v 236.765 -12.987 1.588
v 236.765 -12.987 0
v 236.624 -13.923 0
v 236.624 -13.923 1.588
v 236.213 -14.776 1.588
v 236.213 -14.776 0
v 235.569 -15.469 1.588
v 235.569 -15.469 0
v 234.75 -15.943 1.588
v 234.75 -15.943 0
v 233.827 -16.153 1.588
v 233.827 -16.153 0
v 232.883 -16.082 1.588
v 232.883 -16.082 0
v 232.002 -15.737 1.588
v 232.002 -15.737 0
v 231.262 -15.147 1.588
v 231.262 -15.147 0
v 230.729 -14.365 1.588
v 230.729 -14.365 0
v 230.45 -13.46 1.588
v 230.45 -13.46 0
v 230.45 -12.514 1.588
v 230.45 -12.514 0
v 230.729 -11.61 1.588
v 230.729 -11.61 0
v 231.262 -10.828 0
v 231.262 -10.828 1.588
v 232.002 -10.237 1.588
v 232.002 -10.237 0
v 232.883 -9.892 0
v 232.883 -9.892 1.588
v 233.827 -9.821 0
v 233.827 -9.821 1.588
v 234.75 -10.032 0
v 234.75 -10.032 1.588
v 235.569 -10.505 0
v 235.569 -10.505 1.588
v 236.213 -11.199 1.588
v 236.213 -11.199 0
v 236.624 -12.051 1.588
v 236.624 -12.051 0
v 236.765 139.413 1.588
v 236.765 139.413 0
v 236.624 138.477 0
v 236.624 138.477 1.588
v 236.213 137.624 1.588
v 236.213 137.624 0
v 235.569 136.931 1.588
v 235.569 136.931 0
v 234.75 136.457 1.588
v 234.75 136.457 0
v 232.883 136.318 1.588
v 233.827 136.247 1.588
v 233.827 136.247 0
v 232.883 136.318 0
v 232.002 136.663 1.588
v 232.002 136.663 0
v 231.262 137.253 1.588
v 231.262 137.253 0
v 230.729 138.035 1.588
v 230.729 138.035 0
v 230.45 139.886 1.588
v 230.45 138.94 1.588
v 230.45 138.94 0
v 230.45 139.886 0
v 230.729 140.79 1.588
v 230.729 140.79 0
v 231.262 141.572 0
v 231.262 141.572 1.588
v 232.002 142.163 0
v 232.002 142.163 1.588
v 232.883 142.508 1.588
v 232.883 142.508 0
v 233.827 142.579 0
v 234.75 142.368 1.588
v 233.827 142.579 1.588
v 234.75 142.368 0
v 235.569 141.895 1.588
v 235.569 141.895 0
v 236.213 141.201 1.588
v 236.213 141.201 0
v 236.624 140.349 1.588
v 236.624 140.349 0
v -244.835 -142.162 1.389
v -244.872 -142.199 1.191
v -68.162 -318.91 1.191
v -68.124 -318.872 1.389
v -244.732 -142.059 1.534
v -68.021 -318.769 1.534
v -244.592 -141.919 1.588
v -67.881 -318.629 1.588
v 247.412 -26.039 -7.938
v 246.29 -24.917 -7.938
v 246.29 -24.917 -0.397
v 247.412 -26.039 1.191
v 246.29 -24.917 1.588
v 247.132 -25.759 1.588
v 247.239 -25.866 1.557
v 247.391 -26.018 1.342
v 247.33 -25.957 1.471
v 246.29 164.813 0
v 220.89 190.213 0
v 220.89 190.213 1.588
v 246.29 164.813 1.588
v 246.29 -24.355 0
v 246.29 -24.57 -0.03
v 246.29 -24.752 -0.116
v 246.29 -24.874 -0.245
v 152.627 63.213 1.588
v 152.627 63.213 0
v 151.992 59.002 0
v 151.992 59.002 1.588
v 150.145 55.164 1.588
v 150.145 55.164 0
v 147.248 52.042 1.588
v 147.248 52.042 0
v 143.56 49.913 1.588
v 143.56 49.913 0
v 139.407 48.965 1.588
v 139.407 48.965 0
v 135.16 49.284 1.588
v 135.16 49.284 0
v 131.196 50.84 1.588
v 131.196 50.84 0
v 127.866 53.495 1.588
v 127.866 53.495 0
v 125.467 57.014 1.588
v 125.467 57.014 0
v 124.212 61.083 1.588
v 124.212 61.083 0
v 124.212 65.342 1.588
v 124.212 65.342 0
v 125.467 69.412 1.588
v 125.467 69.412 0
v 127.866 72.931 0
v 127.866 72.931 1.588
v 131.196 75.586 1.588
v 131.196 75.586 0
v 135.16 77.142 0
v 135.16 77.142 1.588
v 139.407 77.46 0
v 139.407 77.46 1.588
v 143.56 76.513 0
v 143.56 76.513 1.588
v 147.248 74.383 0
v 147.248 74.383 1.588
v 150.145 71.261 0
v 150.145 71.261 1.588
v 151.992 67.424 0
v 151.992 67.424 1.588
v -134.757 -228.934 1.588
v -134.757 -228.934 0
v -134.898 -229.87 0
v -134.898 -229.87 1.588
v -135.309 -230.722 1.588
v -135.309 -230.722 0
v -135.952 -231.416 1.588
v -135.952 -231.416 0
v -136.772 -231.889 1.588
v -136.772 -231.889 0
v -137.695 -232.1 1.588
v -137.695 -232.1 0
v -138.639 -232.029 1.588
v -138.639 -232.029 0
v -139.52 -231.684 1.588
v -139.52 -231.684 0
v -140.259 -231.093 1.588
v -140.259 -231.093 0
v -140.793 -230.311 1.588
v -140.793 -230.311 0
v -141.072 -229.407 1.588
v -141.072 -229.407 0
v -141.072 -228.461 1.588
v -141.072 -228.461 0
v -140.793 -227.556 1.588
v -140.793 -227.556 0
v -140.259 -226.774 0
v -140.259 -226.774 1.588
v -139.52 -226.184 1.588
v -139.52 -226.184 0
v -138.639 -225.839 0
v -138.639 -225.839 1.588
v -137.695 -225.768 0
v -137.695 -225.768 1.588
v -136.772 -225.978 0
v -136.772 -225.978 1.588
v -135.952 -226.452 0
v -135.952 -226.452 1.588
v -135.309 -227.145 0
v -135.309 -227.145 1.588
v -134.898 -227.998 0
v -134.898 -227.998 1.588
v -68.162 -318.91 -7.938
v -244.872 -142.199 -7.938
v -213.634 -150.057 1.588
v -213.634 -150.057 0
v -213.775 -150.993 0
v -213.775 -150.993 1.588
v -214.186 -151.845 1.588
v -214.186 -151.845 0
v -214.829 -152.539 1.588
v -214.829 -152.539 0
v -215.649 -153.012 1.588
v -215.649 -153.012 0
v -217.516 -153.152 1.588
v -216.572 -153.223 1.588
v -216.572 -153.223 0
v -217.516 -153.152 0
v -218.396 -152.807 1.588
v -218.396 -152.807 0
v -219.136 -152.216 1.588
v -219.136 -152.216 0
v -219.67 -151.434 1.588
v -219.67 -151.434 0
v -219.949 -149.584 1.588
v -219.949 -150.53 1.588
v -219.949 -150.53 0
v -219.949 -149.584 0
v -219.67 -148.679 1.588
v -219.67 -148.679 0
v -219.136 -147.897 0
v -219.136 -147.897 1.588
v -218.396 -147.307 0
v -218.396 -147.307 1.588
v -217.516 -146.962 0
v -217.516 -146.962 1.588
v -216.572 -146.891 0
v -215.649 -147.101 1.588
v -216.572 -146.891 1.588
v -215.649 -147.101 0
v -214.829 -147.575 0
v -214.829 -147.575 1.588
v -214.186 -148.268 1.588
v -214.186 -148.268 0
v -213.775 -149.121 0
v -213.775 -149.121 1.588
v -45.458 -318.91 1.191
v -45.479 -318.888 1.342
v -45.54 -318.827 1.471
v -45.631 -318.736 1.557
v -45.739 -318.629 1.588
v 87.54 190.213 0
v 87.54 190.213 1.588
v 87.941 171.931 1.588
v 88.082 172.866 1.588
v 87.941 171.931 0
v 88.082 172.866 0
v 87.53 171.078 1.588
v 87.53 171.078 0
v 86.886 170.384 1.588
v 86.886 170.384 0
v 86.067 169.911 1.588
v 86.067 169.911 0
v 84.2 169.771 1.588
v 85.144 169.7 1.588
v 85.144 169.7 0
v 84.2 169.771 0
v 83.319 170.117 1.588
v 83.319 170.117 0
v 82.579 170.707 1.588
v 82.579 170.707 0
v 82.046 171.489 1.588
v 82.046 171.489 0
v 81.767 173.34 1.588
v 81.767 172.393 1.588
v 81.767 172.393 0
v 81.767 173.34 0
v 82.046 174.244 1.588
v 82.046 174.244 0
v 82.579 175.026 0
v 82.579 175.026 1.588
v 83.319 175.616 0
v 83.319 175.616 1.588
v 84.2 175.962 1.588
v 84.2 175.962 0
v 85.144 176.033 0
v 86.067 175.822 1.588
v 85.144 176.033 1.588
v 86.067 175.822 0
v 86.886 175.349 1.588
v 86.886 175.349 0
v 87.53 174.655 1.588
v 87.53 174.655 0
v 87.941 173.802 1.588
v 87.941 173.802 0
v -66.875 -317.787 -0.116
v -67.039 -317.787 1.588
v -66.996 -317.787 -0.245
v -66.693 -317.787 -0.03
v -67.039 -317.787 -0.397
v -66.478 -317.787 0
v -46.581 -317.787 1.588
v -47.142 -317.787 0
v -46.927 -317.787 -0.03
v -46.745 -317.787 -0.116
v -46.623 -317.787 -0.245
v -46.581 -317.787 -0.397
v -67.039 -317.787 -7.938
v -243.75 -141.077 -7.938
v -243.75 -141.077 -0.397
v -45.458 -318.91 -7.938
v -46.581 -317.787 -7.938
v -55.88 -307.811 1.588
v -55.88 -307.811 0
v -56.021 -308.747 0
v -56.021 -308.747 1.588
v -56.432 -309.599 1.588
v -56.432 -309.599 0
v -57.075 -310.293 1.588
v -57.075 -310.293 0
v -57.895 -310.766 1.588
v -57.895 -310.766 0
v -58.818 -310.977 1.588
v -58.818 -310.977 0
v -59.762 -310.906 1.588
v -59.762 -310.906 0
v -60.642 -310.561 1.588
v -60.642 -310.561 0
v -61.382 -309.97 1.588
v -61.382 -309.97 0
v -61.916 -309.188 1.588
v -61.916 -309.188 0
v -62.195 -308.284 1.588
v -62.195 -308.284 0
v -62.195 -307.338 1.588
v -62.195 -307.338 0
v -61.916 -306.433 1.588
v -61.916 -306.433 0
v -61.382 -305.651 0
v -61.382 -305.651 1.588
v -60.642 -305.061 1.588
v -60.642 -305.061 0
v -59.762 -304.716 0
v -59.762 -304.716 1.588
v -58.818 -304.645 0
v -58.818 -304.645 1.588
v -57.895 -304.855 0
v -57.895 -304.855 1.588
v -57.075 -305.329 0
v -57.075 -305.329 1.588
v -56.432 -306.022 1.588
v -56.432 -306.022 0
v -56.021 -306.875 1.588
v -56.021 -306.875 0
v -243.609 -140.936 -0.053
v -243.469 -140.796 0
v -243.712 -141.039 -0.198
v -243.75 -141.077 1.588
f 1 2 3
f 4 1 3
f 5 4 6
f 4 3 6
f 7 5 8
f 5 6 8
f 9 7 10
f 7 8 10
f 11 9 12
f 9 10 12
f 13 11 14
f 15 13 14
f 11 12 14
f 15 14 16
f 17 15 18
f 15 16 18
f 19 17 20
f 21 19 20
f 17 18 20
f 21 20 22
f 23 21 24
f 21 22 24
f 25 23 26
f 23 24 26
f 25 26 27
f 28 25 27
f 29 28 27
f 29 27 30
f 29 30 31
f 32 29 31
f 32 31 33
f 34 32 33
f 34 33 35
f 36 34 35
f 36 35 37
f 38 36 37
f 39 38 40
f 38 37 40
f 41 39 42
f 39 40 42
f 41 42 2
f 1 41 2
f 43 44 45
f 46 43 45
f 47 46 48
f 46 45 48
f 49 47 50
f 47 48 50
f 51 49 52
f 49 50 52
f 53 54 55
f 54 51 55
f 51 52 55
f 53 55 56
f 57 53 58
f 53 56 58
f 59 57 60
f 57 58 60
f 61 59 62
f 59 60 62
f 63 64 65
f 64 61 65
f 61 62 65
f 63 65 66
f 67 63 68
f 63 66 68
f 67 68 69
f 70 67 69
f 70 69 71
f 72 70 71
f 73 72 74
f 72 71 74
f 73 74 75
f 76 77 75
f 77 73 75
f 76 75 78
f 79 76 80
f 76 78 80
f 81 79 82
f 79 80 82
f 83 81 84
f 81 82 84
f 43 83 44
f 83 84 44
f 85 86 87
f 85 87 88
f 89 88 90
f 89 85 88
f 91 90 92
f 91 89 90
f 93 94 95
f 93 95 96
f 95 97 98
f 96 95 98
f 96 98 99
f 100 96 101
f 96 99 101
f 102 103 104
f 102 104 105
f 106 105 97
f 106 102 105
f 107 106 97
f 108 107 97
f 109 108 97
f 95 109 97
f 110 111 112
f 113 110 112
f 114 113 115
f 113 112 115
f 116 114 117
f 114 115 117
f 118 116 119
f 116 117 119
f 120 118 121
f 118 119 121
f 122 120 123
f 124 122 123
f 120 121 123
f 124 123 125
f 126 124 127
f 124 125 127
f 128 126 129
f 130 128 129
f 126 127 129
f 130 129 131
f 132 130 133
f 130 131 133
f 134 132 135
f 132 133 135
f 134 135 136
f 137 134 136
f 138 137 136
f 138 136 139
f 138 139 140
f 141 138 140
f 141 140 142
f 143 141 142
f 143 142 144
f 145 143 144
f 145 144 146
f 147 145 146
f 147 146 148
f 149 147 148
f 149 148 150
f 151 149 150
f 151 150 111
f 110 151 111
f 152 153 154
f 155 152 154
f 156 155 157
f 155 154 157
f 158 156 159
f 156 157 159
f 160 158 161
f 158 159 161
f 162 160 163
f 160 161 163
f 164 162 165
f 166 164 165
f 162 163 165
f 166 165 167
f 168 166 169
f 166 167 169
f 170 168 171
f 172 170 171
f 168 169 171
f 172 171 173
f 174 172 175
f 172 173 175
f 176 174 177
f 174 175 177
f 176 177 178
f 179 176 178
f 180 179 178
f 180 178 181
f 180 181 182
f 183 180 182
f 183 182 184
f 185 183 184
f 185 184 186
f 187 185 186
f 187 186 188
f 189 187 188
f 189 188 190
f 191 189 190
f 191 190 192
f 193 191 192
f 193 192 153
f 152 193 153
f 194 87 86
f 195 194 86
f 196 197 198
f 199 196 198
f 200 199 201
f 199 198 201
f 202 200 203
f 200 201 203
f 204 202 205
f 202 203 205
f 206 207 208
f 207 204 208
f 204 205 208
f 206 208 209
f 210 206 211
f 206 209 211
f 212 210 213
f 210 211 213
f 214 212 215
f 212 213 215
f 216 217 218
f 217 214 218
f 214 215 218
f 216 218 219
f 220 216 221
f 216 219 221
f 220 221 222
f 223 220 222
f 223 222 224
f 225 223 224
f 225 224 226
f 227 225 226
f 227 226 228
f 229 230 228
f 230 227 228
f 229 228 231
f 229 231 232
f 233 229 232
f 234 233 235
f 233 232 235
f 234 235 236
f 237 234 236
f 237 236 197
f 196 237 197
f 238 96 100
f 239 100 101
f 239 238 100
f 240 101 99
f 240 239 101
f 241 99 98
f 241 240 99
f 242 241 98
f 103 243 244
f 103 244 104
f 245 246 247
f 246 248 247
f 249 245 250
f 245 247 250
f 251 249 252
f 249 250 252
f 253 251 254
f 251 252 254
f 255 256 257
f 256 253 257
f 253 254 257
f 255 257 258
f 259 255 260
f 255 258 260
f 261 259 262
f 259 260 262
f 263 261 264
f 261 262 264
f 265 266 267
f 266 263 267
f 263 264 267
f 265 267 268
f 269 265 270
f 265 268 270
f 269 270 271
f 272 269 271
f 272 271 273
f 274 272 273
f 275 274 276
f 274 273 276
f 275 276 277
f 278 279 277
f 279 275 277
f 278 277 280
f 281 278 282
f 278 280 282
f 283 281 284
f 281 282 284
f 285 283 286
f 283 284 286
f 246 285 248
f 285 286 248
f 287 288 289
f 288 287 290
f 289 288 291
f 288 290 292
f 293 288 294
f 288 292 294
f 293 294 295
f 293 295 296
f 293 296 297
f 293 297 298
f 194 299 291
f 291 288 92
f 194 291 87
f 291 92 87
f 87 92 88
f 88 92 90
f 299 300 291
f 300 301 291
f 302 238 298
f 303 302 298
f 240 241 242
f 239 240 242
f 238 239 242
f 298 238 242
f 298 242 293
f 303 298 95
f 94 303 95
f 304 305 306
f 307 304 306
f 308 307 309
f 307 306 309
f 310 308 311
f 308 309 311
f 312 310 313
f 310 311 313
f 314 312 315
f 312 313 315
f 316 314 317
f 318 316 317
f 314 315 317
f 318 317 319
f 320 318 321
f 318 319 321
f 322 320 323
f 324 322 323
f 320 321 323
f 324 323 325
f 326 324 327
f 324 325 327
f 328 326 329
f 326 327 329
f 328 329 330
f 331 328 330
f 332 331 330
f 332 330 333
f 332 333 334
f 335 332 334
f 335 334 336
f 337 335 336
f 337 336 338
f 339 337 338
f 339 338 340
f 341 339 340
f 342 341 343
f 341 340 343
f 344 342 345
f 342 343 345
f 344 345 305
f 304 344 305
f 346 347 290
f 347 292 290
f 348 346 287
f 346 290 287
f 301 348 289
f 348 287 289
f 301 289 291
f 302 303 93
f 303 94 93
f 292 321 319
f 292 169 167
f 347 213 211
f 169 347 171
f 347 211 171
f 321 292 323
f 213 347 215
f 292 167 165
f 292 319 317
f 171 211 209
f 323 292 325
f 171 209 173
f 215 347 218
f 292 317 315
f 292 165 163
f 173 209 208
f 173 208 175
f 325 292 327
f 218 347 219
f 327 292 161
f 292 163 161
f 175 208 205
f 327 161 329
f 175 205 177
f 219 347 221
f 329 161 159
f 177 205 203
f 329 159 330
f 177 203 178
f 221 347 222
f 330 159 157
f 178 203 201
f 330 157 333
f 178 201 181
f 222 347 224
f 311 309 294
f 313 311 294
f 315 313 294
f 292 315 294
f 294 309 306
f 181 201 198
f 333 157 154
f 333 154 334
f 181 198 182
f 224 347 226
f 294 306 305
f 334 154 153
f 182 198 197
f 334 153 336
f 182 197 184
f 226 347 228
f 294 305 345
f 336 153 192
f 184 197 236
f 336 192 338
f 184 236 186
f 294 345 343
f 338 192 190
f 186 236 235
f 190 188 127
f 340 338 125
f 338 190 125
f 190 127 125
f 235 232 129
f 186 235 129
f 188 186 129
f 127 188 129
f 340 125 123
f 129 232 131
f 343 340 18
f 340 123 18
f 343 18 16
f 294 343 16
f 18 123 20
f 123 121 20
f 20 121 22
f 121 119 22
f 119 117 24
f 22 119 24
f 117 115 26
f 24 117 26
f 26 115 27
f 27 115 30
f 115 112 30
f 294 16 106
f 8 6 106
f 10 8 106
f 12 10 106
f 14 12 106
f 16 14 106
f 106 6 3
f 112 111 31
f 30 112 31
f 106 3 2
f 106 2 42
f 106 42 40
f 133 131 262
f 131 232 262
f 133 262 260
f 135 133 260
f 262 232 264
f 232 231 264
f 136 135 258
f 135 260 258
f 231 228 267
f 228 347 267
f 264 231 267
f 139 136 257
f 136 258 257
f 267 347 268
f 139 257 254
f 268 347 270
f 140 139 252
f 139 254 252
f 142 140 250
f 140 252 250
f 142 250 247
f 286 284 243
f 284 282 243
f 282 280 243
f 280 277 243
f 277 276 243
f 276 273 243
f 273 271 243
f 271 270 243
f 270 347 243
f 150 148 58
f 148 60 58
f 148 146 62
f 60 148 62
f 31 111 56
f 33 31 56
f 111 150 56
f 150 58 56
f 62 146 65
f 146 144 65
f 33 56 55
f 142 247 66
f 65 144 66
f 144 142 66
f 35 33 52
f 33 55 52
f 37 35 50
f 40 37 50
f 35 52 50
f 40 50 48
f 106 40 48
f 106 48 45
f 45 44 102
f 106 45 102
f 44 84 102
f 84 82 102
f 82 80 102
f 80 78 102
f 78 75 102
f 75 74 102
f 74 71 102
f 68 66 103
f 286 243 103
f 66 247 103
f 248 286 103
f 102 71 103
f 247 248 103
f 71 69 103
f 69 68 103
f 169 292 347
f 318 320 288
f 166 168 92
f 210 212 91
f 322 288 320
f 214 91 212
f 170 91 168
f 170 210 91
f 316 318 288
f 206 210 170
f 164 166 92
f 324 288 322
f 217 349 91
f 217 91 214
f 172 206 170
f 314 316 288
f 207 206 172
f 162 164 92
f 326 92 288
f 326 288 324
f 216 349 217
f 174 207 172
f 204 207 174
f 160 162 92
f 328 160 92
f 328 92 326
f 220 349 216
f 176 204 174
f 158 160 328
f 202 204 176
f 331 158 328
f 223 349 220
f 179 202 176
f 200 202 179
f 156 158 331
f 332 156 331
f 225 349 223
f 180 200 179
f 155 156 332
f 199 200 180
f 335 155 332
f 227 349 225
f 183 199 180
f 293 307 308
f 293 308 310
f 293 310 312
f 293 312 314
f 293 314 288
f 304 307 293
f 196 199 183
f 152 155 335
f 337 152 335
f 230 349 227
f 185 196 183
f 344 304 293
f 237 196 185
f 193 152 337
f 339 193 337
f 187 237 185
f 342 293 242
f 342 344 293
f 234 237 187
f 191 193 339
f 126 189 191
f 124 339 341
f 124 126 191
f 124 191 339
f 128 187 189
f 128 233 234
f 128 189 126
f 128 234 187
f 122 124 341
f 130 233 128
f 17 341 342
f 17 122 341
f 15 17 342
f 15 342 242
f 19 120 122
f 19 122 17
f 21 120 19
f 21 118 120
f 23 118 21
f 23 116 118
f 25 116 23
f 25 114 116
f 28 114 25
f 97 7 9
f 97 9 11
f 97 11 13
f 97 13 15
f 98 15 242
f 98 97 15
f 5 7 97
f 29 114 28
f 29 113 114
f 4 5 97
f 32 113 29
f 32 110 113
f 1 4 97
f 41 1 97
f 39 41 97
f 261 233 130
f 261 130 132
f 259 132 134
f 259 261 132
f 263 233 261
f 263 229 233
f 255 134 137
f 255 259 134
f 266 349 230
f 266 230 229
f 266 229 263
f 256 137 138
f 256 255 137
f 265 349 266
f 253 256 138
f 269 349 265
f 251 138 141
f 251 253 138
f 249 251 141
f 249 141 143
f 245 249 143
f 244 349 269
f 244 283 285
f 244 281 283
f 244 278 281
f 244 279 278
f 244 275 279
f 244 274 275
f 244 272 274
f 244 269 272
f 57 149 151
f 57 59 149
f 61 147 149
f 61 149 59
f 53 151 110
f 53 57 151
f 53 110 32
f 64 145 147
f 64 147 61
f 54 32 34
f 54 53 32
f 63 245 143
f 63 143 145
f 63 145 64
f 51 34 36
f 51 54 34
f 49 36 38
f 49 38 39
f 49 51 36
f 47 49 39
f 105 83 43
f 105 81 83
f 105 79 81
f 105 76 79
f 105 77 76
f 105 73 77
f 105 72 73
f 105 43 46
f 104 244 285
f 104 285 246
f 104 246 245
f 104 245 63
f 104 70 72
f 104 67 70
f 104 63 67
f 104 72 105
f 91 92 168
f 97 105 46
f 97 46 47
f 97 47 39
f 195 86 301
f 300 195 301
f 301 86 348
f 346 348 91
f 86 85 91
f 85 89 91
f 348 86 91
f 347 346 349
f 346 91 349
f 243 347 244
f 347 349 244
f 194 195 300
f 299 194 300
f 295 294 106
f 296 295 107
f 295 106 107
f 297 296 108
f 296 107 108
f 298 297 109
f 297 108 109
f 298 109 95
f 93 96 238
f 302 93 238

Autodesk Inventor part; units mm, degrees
ref_plane "YZ Plane" through (0, 0, 0) normal (1, 0, 0) x (0, 1, 0)
ref_plane "XZ Plane" through (0, 0, 0) normal (0, 1, 0) x (-1, 0, 0)
ref_plane "XY Plane" through (0, 0, 0) normal (0, 0, 1) x (1, 0, 0)
sketch "Sketch1" plane through (0, 0, 0) normal (0, 0, 1) x (1, 0, 0)
  line L0 (220.8897, 190.2129) -> (246.2897, 164.8129)
  line L1 (246.2897, 164.8129) -> (246.2897, -38.3871)
  line L2 (246.2897, -38.3871) -> (-33.1103, -317.7871)
  line L3 (-102.9603, -317.7871) -> (-261.7103, -159.0371)
  line L4 (-261.7103, -159.0371) -> (87.5397, 190.2129)
  circle A0 centre (233.5897, -12.9871) radius 3.175
  circle A1 centre (233.5897, 139.4129) radius 3.175
  circle A2 centre (84.9068, 172.8665) radius 3.175
  line L5 (84.9068, 172.8665) -> (233.5897, 139.4129) construction
  line L6 (233.5897, 139.4129) -> (233.5897, -12.9871) construction
  line L7 (-102.9603, -317.7871) -> (-33.1103, -317.7871)
  circle A3 centre (138.3397, 63.2129) radius 14.2875
  line L8 (84.9068, 172.8665) -> (138.3397, 63.2129) construction
  line L9 (138.3397, 63.2129) -> (233.5897, 139.4129) construction
  line L10 (138.3397, 63.2129) -> (233.5897, -12.9871) construction
  circle A4 centre (-59.055, -307.8109) radius 3.175
  circle A5 centre (-216.809, -150.0569) radius 3.175
  circle A6 centre (-137.932, -228.9339) radius 3.175
  line L11 (87.5397, 190.2129) -> (220.8897, 190.2129)
  line L12 (-216.809, -150.0569) -> (-137.932, -228.9339) construction
  line L13 (-137.932, -228.9339) -> (-59.055, -307.8109) construction
  point P0 (0, 0)
  dimension "d222" = 203.2
  dimension "d228" = 12.7
  dimension "d229" = 152.4
  dimension "d230" = 25.4
  dimension "d233" = 135
  dimension "d236" = 6.35
  dimension "d237" = 381
  dimension "d238" = 107.95
  dimension "d240" = 508
  dimension "d241" = 158.75
  dimension "d242" = 28.575
  dimension "d247" = 279.4
  dimension "d248" = 508
  dimension "d249" = 6.35
  dimension "d250" = 38.1
  dimension "d252" = 25.4
  dimension "d253" = 25.4
extrude "Extrusion14" add sketch "Sketch1" along normal blind 1.5875
sketch "Sketch12" plane through (0, 0, 1.5875) normal (0, 0, 1) x (1, 0, 0)
  line L0 (-33.1103, -317.7871) -> (-102.9603, -317.7871) projected
  line L1 (246.2897, -38.3871) -> (-33.1103, -317.7871) projected
  line L2 (246.2897, 164.8129) -> (246.2897, -38.3871) projected
  line L3 (220.8897, 190.2129) -> (246.2897, 164.8129) projected
  line L4 (-46.5806, -317.7871) -> (246.2897, -24.9168)
  line L5 (246.2897, -24.9168) -> (246.2897, -38.3871)
  line L6 (-33.1103, -317.7871) -> (246.2897, -38.3871)
  line L7 (-46.5806, -317.7871) -> (-33.1103, -317.7871)
  point P0 (0, 0)
  dimension "d254" = 9.525
extrude "Extrusion15" cut sketch "Sketch12" against normal up to next
sketch "Sketch13" plane through (0, 0, 1.5875) normal (0, 0, 1) x (1, 0, 0)
  line L0 (-46.5806, -317.7871) -> (246.2897, -24.9168) projected
  line L1 (-46.5806, -317.7871) -> (246.2897, -24.9168)
  line L2 (246.2897, -24.9168) -> (247.4123, -26.0393)
  line L3 (247.4123, -26.0393) -> (-45.4581, -318.9097)
  line L4 (-45.4581, -318.9097) -> (-46.5806, -317.7871)
  point P0 (0, 0)
  dimension "d257" = 1.5875
extrude "Extrusion16" add sketch "Sketch13" against normal blind 9.525
sketch "Sketch14" plane through (0, 0, 1.5875) normal (0, 0, 1) x (1, 0, 0)
  line L0 (-261.7103, -159.0371) -> (87.5397, 190.2129) projected
  line L1 (-102.9603, -317.7871) -> (-261.7103, -159.0371) projected
  line L2 (-46.5806, -317.7871) -> (-102.9603, -317.7871) projected
  line L3 (-261.7103, -159.0371) -> (-243.7497, -141.0766)
  line L4 (-243.7497, -141.0766) -> (-67.0392, -317.7871)
  line L5 (-67.0392, -317.7871) -> (-84.9997, -335.7476)
  line L6 (-84.9997, -335.7476) -> (-261.7103, -159.0371)
  point P0 (0, 0)
  dimension "d262" = 25.4
extrude "Extrusion17" cut sketch "Sketch14" against normal up to next contours L0 L4 L2 L1
sketch "Sketch15" plane through (0, 0, 1.5875) normal (0, 0, 1) x (1, 0, 0)
  line L0 (-243.7497, -141.0766) -> (-67.0392, -317.7871) projected
  line L1 (-243.7497, -141.0766) -> (-67.0392, -317.7871)
  line L2 (-67.0392, -317.7871) -> (-68.1618, -318.9097)
  line L3 (-68.1618, -318.9097) -> (-244.8723, -142.1992)
  line L4 (-244.8723, -142.1992) -> (-243.7497, -141.0766)
  point P0 (0, 0)
  dimension "d266" = 1.5875
extrude "Extrusion18" add sketch "Sketch15" against normal blind 9.525
fillet "Fillet1" radius 0.3969 4 edges at (-156.517, -230.5544, 1.5875) (99.8545, -171.3519, 0) (-155.3945, -229.4319, 0) (100.9771, -172.4745, 1.5875)
properties part number "Shooter Plate" material "Aluminum-6061"
